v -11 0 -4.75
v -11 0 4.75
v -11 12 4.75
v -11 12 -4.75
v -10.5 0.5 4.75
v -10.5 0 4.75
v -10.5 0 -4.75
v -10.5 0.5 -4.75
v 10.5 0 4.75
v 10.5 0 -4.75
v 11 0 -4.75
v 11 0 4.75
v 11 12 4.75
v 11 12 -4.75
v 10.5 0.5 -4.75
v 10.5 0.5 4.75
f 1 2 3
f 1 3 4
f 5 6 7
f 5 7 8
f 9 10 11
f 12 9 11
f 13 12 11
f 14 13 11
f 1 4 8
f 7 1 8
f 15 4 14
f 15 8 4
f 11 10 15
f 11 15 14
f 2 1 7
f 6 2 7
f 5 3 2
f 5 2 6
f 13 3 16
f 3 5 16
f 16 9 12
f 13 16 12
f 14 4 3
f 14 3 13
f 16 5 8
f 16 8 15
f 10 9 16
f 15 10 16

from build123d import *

# Parameters (mm, degrees)
SKETCH1_W           = 22
SKETCH1_H           = 9.5
BOSS_EXTRUDE1_DEPTH = 12
CUT_EXTRUDE1_REACH  = 20.848
SKETCH2_W           = 21
SKETCH2_H           = 1.851123708


with BuildPart() as part:
    # Sketch1 → Boss-Extrude1 (new body)
    with BuildSketch(Plane(origin=(0, 0, 0), x_dir=(1, 0, 0), z_dir=(0, 1, 0))):
        Rectangle(SKETCH1_W, SKETCH1_H)
    extrude(amount=BOSS_EXTRUDE1_DEPTH)

    # Sketch2 → Cut-Extrude1 (cut, up to next)
    with BuildSketch(Plane.XY.offset(4.75), mode=Mode.PRIVATE) as cut_extrude1_sk1:
        with Locations((0, -0.425561854)):
            Rectangle(SKETCH2_W, SKETCH2_H)
    cut_extrude1_tool1 = extrude(cut_extrude1_sk1.sketch, amount=-CUT_EXTRUDE1_REACH, mode=Mode.PRIVATE) & part.part
    add(cut_extrude1_tool1.solids().sort_by_distance((0, -0.425562, 4.75))[0], mode=Mode.SUBTRACT)


solid = part.part
